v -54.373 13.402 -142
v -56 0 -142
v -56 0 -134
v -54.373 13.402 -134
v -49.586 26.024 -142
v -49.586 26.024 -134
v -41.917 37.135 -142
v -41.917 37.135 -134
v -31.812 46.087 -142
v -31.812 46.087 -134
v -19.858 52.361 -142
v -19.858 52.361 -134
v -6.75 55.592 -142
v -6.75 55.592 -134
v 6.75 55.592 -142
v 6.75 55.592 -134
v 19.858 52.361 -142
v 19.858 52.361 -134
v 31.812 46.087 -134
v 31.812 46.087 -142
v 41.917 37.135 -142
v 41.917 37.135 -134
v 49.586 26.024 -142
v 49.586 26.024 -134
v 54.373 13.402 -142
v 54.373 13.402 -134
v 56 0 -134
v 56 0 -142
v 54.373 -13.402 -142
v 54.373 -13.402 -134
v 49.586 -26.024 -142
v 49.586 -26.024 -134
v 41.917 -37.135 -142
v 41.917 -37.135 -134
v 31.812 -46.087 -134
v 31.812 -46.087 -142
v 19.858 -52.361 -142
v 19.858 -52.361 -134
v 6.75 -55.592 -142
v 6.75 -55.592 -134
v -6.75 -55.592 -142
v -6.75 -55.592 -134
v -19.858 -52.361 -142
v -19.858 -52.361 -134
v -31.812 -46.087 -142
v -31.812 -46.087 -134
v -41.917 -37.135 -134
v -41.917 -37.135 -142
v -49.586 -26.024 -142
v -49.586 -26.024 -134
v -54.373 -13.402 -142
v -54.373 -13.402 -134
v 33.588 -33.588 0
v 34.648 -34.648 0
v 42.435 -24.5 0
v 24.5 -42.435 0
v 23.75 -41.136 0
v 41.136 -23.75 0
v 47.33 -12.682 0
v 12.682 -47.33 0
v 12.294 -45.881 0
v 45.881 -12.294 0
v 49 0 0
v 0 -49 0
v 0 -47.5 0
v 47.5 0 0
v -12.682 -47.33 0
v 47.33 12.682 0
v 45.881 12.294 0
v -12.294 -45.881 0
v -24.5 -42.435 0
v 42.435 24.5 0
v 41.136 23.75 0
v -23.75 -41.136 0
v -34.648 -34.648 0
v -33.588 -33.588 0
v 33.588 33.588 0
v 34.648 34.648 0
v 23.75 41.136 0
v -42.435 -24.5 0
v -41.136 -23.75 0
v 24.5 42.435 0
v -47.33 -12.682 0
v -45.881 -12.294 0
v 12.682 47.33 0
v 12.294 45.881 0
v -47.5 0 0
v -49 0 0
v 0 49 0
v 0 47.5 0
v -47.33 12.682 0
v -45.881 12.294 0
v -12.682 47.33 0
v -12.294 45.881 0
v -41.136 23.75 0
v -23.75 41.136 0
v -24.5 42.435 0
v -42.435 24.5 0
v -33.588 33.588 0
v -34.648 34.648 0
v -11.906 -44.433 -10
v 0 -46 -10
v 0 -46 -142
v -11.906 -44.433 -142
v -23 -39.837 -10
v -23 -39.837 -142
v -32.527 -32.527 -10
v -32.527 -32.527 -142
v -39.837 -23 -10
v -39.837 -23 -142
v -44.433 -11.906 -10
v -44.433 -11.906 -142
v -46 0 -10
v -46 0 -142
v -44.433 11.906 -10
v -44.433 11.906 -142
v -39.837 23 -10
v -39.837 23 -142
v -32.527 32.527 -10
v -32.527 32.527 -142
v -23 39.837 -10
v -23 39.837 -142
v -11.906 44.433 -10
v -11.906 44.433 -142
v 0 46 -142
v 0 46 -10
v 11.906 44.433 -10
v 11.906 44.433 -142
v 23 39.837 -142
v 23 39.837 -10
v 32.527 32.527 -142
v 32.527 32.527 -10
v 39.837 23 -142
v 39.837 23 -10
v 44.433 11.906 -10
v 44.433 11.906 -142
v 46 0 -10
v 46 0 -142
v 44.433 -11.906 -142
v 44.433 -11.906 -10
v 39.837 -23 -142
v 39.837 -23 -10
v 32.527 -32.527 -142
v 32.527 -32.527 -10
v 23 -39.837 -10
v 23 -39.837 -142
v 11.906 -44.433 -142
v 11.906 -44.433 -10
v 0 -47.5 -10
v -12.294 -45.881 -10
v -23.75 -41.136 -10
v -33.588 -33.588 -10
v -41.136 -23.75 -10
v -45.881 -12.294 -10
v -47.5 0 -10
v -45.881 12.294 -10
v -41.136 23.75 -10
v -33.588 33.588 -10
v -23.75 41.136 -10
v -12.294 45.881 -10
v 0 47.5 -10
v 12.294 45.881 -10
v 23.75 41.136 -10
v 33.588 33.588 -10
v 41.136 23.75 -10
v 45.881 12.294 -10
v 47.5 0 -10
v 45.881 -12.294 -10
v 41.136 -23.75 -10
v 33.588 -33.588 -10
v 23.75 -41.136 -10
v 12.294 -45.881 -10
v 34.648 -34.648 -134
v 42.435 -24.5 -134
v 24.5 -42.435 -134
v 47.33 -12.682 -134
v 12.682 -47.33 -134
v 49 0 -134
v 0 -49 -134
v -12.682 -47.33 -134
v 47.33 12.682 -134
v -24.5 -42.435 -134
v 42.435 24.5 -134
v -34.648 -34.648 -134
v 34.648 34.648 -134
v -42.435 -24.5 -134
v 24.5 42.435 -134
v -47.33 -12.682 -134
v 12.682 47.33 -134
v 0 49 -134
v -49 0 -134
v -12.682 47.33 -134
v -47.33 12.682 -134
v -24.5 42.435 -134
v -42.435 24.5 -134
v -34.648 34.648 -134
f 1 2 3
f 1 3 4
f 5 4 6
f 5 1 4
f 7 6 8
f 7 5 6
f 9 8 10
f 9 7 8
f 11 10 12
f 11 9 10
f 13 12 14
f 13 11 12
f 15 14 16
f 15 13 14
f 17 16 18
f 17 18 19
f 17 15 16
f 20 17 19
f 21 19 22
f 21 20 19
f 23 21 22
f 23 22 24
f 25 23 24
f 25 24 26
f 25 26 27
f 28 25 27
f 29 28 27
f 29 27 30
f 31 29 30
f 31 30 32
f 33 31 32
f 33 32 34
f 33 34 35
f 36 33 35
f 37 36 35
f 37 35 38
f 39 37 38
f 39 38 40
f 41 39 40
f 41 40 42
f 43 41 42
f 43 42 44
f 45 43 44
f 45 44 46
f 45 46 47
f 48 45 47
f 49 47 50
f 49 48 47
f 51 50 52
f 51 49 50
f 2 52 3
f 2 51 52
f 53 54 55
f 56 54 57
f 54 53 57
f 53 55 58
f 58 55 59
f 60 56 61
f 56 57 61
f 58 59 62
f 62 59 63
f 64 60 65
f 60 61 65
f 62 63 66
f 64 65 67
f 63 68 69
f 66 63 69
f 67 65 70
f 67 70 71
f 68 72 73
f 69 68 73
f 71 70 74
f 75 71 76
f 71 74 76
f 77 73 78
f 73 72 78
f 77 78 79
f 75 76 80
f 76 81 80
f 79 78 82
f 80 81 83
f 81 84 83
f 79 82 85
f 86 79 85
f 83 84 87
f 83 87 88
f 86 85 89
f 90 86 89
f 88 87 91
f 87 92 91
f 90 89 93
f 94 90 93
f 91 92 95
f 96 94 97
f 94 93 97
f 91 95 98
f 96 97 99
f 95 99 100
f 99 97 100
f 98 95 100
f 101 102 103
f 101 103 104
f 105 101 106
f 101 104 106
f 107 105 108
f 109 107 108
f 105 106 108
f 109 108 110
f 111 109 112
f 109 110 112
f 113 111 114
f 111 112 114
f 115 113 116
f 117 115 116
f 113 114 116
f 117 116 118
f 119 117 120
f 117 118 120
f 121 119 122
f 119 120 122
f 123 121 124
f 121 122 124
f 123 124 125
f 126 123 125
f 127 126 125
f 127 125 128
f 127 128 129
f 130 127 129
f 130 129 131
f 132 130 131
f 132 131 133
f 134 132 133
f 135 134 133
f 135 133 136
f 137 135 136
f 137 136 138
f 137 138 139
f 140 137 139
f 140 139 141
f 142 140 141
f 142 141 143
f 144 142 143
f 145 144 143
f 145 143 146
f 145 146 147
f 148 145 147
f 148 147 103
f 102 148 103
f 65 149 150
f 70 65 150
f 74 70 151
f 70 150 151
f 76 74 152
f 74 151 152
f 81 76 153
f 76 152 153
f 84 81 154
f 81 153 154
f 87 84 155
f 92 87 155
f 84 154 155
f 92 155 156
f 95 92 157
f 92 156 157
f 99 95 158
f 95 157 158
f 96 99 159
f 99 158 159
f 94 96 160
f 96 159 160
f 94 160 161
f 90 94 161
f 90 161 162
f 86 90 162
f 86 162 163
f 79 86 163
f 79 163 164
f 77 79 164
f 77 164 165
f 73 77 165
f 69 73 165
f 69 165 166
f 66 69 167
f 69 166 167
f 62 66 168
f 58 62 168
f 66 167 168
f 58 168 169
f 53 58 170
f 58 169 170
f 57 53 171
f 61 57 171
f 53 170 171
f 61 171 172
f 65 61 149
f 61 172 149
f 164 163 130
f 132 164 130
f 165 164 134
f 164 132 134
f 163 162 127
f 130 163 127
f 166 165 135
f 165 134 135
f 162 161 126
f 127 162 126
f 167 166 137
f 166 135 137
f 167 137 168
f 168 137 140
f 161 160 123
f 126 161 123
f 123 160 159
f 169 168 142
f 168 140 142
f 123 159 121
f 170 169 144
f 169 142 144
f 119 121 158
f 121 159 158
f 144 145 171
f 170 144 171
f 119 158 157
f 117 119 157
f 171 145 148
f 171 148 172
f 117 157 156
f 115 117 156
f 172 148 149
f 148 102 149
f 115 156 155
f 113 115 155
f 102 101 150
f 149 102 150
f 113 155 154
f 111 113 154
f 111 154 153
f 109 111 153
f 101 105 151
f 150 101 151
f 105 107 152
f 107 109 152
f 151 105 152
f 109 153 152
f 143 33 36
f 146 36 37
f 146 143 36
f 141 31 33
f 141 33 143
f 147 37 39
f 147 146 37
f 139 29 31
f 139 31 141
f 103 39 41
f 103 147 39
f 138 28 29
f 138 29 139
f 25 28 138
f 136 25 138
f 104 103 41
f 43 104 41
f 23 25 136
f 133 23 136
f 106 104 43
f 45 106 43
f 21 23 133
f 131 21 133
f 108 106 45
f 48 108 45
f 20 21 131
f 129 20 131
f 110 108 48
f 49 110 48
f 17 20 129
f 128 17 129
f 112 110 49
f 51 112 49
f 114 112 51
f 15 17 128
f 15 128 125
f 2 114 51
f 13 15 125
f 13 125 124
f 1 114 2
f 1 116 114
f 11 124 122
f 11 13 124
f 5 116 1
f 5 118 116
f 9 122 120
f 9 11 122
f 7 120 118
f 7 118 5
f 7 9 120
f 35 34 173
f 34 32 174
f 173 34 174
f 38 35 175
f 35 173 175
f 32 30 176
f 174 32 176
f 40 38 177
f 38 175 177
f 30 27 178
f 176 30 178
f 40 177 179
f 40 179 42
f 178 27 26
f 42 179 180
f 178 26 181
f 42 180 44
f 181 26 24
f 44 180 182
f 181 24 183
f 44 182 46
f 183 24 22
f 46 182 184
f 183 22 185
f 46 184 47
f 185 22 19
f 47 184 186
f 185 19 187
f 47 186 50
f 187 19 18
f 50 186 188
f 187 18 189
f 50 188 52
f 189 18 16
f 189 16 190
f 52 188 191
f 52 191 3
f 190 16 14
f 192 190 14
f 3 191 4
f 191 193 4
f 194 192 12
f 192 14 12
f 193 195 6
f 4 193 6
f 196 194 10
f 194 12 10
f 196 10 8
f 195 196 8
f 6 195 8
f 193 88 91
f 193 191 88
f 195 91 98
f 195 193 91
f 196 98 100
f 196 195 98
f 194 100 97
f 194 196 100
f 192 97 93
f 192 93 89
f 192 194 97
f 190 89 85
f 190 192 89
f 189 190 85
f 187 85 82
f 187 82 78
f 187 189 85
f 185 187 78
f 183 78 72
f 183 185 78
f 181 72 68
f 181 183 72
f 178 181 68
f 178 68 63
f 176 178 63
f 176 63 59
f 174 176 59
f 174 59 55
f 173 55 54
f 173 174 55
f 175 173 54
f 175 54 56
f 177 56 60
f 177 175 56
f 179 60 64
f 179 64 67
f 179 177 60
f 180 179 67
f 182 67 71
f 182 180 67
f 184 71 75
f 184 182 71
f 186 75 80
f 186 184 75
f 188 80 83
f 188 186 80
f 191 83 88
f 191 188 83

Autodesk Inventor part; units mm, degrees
ref_plane "YZ Plane" through (0, 0, 0) normal (1, 0, 0) x (0, 1, 0)
ref_plane "XZ Plane" through (0, 0, 0) normal (0, 1, 0) x (-1, 0, 0)
ref_plane "XY Plane" through (0, 0, 0) normal (0, 0, 1) x (1, 0, 0)
sketch "Skizze1" plane through (0, 0, 0) normal (0, 1, 0) x (-1, 0, 0)
  line L0 (0, 0) -> (0, -142)
  line L1 (0, 0) -> (49, 0)
  line L2 (49, 0) -> (49, -134)
  line L3 (49, -134) -> (56, -134)
  line L4 (56, -134) -> (56, -142)
  line L5 (56, -142) -> (0, -142)
  dimension "d0" = 112
  dimension "d1" = 8
  dimension "d2" = 134
  dimension "d3" = 98
revolve "Umdrehung1" add sketch "Skizze1" angle 360 about axis through (0, 0, 0) along (0, 0, -1)
sketch "Skizze2" plane through (0, 0, 0) normal (0, 0, 1) x (1, 0, 0)
  circle A0 centre (0, 0) radius 49 projected
hole "Bohrung1" at (0, 0, 0) direction (0, 0, -1) diameter 92 end through all counterbore diameter 95 counterbore depth 10
properties part number "13" material "Phenolharz"
